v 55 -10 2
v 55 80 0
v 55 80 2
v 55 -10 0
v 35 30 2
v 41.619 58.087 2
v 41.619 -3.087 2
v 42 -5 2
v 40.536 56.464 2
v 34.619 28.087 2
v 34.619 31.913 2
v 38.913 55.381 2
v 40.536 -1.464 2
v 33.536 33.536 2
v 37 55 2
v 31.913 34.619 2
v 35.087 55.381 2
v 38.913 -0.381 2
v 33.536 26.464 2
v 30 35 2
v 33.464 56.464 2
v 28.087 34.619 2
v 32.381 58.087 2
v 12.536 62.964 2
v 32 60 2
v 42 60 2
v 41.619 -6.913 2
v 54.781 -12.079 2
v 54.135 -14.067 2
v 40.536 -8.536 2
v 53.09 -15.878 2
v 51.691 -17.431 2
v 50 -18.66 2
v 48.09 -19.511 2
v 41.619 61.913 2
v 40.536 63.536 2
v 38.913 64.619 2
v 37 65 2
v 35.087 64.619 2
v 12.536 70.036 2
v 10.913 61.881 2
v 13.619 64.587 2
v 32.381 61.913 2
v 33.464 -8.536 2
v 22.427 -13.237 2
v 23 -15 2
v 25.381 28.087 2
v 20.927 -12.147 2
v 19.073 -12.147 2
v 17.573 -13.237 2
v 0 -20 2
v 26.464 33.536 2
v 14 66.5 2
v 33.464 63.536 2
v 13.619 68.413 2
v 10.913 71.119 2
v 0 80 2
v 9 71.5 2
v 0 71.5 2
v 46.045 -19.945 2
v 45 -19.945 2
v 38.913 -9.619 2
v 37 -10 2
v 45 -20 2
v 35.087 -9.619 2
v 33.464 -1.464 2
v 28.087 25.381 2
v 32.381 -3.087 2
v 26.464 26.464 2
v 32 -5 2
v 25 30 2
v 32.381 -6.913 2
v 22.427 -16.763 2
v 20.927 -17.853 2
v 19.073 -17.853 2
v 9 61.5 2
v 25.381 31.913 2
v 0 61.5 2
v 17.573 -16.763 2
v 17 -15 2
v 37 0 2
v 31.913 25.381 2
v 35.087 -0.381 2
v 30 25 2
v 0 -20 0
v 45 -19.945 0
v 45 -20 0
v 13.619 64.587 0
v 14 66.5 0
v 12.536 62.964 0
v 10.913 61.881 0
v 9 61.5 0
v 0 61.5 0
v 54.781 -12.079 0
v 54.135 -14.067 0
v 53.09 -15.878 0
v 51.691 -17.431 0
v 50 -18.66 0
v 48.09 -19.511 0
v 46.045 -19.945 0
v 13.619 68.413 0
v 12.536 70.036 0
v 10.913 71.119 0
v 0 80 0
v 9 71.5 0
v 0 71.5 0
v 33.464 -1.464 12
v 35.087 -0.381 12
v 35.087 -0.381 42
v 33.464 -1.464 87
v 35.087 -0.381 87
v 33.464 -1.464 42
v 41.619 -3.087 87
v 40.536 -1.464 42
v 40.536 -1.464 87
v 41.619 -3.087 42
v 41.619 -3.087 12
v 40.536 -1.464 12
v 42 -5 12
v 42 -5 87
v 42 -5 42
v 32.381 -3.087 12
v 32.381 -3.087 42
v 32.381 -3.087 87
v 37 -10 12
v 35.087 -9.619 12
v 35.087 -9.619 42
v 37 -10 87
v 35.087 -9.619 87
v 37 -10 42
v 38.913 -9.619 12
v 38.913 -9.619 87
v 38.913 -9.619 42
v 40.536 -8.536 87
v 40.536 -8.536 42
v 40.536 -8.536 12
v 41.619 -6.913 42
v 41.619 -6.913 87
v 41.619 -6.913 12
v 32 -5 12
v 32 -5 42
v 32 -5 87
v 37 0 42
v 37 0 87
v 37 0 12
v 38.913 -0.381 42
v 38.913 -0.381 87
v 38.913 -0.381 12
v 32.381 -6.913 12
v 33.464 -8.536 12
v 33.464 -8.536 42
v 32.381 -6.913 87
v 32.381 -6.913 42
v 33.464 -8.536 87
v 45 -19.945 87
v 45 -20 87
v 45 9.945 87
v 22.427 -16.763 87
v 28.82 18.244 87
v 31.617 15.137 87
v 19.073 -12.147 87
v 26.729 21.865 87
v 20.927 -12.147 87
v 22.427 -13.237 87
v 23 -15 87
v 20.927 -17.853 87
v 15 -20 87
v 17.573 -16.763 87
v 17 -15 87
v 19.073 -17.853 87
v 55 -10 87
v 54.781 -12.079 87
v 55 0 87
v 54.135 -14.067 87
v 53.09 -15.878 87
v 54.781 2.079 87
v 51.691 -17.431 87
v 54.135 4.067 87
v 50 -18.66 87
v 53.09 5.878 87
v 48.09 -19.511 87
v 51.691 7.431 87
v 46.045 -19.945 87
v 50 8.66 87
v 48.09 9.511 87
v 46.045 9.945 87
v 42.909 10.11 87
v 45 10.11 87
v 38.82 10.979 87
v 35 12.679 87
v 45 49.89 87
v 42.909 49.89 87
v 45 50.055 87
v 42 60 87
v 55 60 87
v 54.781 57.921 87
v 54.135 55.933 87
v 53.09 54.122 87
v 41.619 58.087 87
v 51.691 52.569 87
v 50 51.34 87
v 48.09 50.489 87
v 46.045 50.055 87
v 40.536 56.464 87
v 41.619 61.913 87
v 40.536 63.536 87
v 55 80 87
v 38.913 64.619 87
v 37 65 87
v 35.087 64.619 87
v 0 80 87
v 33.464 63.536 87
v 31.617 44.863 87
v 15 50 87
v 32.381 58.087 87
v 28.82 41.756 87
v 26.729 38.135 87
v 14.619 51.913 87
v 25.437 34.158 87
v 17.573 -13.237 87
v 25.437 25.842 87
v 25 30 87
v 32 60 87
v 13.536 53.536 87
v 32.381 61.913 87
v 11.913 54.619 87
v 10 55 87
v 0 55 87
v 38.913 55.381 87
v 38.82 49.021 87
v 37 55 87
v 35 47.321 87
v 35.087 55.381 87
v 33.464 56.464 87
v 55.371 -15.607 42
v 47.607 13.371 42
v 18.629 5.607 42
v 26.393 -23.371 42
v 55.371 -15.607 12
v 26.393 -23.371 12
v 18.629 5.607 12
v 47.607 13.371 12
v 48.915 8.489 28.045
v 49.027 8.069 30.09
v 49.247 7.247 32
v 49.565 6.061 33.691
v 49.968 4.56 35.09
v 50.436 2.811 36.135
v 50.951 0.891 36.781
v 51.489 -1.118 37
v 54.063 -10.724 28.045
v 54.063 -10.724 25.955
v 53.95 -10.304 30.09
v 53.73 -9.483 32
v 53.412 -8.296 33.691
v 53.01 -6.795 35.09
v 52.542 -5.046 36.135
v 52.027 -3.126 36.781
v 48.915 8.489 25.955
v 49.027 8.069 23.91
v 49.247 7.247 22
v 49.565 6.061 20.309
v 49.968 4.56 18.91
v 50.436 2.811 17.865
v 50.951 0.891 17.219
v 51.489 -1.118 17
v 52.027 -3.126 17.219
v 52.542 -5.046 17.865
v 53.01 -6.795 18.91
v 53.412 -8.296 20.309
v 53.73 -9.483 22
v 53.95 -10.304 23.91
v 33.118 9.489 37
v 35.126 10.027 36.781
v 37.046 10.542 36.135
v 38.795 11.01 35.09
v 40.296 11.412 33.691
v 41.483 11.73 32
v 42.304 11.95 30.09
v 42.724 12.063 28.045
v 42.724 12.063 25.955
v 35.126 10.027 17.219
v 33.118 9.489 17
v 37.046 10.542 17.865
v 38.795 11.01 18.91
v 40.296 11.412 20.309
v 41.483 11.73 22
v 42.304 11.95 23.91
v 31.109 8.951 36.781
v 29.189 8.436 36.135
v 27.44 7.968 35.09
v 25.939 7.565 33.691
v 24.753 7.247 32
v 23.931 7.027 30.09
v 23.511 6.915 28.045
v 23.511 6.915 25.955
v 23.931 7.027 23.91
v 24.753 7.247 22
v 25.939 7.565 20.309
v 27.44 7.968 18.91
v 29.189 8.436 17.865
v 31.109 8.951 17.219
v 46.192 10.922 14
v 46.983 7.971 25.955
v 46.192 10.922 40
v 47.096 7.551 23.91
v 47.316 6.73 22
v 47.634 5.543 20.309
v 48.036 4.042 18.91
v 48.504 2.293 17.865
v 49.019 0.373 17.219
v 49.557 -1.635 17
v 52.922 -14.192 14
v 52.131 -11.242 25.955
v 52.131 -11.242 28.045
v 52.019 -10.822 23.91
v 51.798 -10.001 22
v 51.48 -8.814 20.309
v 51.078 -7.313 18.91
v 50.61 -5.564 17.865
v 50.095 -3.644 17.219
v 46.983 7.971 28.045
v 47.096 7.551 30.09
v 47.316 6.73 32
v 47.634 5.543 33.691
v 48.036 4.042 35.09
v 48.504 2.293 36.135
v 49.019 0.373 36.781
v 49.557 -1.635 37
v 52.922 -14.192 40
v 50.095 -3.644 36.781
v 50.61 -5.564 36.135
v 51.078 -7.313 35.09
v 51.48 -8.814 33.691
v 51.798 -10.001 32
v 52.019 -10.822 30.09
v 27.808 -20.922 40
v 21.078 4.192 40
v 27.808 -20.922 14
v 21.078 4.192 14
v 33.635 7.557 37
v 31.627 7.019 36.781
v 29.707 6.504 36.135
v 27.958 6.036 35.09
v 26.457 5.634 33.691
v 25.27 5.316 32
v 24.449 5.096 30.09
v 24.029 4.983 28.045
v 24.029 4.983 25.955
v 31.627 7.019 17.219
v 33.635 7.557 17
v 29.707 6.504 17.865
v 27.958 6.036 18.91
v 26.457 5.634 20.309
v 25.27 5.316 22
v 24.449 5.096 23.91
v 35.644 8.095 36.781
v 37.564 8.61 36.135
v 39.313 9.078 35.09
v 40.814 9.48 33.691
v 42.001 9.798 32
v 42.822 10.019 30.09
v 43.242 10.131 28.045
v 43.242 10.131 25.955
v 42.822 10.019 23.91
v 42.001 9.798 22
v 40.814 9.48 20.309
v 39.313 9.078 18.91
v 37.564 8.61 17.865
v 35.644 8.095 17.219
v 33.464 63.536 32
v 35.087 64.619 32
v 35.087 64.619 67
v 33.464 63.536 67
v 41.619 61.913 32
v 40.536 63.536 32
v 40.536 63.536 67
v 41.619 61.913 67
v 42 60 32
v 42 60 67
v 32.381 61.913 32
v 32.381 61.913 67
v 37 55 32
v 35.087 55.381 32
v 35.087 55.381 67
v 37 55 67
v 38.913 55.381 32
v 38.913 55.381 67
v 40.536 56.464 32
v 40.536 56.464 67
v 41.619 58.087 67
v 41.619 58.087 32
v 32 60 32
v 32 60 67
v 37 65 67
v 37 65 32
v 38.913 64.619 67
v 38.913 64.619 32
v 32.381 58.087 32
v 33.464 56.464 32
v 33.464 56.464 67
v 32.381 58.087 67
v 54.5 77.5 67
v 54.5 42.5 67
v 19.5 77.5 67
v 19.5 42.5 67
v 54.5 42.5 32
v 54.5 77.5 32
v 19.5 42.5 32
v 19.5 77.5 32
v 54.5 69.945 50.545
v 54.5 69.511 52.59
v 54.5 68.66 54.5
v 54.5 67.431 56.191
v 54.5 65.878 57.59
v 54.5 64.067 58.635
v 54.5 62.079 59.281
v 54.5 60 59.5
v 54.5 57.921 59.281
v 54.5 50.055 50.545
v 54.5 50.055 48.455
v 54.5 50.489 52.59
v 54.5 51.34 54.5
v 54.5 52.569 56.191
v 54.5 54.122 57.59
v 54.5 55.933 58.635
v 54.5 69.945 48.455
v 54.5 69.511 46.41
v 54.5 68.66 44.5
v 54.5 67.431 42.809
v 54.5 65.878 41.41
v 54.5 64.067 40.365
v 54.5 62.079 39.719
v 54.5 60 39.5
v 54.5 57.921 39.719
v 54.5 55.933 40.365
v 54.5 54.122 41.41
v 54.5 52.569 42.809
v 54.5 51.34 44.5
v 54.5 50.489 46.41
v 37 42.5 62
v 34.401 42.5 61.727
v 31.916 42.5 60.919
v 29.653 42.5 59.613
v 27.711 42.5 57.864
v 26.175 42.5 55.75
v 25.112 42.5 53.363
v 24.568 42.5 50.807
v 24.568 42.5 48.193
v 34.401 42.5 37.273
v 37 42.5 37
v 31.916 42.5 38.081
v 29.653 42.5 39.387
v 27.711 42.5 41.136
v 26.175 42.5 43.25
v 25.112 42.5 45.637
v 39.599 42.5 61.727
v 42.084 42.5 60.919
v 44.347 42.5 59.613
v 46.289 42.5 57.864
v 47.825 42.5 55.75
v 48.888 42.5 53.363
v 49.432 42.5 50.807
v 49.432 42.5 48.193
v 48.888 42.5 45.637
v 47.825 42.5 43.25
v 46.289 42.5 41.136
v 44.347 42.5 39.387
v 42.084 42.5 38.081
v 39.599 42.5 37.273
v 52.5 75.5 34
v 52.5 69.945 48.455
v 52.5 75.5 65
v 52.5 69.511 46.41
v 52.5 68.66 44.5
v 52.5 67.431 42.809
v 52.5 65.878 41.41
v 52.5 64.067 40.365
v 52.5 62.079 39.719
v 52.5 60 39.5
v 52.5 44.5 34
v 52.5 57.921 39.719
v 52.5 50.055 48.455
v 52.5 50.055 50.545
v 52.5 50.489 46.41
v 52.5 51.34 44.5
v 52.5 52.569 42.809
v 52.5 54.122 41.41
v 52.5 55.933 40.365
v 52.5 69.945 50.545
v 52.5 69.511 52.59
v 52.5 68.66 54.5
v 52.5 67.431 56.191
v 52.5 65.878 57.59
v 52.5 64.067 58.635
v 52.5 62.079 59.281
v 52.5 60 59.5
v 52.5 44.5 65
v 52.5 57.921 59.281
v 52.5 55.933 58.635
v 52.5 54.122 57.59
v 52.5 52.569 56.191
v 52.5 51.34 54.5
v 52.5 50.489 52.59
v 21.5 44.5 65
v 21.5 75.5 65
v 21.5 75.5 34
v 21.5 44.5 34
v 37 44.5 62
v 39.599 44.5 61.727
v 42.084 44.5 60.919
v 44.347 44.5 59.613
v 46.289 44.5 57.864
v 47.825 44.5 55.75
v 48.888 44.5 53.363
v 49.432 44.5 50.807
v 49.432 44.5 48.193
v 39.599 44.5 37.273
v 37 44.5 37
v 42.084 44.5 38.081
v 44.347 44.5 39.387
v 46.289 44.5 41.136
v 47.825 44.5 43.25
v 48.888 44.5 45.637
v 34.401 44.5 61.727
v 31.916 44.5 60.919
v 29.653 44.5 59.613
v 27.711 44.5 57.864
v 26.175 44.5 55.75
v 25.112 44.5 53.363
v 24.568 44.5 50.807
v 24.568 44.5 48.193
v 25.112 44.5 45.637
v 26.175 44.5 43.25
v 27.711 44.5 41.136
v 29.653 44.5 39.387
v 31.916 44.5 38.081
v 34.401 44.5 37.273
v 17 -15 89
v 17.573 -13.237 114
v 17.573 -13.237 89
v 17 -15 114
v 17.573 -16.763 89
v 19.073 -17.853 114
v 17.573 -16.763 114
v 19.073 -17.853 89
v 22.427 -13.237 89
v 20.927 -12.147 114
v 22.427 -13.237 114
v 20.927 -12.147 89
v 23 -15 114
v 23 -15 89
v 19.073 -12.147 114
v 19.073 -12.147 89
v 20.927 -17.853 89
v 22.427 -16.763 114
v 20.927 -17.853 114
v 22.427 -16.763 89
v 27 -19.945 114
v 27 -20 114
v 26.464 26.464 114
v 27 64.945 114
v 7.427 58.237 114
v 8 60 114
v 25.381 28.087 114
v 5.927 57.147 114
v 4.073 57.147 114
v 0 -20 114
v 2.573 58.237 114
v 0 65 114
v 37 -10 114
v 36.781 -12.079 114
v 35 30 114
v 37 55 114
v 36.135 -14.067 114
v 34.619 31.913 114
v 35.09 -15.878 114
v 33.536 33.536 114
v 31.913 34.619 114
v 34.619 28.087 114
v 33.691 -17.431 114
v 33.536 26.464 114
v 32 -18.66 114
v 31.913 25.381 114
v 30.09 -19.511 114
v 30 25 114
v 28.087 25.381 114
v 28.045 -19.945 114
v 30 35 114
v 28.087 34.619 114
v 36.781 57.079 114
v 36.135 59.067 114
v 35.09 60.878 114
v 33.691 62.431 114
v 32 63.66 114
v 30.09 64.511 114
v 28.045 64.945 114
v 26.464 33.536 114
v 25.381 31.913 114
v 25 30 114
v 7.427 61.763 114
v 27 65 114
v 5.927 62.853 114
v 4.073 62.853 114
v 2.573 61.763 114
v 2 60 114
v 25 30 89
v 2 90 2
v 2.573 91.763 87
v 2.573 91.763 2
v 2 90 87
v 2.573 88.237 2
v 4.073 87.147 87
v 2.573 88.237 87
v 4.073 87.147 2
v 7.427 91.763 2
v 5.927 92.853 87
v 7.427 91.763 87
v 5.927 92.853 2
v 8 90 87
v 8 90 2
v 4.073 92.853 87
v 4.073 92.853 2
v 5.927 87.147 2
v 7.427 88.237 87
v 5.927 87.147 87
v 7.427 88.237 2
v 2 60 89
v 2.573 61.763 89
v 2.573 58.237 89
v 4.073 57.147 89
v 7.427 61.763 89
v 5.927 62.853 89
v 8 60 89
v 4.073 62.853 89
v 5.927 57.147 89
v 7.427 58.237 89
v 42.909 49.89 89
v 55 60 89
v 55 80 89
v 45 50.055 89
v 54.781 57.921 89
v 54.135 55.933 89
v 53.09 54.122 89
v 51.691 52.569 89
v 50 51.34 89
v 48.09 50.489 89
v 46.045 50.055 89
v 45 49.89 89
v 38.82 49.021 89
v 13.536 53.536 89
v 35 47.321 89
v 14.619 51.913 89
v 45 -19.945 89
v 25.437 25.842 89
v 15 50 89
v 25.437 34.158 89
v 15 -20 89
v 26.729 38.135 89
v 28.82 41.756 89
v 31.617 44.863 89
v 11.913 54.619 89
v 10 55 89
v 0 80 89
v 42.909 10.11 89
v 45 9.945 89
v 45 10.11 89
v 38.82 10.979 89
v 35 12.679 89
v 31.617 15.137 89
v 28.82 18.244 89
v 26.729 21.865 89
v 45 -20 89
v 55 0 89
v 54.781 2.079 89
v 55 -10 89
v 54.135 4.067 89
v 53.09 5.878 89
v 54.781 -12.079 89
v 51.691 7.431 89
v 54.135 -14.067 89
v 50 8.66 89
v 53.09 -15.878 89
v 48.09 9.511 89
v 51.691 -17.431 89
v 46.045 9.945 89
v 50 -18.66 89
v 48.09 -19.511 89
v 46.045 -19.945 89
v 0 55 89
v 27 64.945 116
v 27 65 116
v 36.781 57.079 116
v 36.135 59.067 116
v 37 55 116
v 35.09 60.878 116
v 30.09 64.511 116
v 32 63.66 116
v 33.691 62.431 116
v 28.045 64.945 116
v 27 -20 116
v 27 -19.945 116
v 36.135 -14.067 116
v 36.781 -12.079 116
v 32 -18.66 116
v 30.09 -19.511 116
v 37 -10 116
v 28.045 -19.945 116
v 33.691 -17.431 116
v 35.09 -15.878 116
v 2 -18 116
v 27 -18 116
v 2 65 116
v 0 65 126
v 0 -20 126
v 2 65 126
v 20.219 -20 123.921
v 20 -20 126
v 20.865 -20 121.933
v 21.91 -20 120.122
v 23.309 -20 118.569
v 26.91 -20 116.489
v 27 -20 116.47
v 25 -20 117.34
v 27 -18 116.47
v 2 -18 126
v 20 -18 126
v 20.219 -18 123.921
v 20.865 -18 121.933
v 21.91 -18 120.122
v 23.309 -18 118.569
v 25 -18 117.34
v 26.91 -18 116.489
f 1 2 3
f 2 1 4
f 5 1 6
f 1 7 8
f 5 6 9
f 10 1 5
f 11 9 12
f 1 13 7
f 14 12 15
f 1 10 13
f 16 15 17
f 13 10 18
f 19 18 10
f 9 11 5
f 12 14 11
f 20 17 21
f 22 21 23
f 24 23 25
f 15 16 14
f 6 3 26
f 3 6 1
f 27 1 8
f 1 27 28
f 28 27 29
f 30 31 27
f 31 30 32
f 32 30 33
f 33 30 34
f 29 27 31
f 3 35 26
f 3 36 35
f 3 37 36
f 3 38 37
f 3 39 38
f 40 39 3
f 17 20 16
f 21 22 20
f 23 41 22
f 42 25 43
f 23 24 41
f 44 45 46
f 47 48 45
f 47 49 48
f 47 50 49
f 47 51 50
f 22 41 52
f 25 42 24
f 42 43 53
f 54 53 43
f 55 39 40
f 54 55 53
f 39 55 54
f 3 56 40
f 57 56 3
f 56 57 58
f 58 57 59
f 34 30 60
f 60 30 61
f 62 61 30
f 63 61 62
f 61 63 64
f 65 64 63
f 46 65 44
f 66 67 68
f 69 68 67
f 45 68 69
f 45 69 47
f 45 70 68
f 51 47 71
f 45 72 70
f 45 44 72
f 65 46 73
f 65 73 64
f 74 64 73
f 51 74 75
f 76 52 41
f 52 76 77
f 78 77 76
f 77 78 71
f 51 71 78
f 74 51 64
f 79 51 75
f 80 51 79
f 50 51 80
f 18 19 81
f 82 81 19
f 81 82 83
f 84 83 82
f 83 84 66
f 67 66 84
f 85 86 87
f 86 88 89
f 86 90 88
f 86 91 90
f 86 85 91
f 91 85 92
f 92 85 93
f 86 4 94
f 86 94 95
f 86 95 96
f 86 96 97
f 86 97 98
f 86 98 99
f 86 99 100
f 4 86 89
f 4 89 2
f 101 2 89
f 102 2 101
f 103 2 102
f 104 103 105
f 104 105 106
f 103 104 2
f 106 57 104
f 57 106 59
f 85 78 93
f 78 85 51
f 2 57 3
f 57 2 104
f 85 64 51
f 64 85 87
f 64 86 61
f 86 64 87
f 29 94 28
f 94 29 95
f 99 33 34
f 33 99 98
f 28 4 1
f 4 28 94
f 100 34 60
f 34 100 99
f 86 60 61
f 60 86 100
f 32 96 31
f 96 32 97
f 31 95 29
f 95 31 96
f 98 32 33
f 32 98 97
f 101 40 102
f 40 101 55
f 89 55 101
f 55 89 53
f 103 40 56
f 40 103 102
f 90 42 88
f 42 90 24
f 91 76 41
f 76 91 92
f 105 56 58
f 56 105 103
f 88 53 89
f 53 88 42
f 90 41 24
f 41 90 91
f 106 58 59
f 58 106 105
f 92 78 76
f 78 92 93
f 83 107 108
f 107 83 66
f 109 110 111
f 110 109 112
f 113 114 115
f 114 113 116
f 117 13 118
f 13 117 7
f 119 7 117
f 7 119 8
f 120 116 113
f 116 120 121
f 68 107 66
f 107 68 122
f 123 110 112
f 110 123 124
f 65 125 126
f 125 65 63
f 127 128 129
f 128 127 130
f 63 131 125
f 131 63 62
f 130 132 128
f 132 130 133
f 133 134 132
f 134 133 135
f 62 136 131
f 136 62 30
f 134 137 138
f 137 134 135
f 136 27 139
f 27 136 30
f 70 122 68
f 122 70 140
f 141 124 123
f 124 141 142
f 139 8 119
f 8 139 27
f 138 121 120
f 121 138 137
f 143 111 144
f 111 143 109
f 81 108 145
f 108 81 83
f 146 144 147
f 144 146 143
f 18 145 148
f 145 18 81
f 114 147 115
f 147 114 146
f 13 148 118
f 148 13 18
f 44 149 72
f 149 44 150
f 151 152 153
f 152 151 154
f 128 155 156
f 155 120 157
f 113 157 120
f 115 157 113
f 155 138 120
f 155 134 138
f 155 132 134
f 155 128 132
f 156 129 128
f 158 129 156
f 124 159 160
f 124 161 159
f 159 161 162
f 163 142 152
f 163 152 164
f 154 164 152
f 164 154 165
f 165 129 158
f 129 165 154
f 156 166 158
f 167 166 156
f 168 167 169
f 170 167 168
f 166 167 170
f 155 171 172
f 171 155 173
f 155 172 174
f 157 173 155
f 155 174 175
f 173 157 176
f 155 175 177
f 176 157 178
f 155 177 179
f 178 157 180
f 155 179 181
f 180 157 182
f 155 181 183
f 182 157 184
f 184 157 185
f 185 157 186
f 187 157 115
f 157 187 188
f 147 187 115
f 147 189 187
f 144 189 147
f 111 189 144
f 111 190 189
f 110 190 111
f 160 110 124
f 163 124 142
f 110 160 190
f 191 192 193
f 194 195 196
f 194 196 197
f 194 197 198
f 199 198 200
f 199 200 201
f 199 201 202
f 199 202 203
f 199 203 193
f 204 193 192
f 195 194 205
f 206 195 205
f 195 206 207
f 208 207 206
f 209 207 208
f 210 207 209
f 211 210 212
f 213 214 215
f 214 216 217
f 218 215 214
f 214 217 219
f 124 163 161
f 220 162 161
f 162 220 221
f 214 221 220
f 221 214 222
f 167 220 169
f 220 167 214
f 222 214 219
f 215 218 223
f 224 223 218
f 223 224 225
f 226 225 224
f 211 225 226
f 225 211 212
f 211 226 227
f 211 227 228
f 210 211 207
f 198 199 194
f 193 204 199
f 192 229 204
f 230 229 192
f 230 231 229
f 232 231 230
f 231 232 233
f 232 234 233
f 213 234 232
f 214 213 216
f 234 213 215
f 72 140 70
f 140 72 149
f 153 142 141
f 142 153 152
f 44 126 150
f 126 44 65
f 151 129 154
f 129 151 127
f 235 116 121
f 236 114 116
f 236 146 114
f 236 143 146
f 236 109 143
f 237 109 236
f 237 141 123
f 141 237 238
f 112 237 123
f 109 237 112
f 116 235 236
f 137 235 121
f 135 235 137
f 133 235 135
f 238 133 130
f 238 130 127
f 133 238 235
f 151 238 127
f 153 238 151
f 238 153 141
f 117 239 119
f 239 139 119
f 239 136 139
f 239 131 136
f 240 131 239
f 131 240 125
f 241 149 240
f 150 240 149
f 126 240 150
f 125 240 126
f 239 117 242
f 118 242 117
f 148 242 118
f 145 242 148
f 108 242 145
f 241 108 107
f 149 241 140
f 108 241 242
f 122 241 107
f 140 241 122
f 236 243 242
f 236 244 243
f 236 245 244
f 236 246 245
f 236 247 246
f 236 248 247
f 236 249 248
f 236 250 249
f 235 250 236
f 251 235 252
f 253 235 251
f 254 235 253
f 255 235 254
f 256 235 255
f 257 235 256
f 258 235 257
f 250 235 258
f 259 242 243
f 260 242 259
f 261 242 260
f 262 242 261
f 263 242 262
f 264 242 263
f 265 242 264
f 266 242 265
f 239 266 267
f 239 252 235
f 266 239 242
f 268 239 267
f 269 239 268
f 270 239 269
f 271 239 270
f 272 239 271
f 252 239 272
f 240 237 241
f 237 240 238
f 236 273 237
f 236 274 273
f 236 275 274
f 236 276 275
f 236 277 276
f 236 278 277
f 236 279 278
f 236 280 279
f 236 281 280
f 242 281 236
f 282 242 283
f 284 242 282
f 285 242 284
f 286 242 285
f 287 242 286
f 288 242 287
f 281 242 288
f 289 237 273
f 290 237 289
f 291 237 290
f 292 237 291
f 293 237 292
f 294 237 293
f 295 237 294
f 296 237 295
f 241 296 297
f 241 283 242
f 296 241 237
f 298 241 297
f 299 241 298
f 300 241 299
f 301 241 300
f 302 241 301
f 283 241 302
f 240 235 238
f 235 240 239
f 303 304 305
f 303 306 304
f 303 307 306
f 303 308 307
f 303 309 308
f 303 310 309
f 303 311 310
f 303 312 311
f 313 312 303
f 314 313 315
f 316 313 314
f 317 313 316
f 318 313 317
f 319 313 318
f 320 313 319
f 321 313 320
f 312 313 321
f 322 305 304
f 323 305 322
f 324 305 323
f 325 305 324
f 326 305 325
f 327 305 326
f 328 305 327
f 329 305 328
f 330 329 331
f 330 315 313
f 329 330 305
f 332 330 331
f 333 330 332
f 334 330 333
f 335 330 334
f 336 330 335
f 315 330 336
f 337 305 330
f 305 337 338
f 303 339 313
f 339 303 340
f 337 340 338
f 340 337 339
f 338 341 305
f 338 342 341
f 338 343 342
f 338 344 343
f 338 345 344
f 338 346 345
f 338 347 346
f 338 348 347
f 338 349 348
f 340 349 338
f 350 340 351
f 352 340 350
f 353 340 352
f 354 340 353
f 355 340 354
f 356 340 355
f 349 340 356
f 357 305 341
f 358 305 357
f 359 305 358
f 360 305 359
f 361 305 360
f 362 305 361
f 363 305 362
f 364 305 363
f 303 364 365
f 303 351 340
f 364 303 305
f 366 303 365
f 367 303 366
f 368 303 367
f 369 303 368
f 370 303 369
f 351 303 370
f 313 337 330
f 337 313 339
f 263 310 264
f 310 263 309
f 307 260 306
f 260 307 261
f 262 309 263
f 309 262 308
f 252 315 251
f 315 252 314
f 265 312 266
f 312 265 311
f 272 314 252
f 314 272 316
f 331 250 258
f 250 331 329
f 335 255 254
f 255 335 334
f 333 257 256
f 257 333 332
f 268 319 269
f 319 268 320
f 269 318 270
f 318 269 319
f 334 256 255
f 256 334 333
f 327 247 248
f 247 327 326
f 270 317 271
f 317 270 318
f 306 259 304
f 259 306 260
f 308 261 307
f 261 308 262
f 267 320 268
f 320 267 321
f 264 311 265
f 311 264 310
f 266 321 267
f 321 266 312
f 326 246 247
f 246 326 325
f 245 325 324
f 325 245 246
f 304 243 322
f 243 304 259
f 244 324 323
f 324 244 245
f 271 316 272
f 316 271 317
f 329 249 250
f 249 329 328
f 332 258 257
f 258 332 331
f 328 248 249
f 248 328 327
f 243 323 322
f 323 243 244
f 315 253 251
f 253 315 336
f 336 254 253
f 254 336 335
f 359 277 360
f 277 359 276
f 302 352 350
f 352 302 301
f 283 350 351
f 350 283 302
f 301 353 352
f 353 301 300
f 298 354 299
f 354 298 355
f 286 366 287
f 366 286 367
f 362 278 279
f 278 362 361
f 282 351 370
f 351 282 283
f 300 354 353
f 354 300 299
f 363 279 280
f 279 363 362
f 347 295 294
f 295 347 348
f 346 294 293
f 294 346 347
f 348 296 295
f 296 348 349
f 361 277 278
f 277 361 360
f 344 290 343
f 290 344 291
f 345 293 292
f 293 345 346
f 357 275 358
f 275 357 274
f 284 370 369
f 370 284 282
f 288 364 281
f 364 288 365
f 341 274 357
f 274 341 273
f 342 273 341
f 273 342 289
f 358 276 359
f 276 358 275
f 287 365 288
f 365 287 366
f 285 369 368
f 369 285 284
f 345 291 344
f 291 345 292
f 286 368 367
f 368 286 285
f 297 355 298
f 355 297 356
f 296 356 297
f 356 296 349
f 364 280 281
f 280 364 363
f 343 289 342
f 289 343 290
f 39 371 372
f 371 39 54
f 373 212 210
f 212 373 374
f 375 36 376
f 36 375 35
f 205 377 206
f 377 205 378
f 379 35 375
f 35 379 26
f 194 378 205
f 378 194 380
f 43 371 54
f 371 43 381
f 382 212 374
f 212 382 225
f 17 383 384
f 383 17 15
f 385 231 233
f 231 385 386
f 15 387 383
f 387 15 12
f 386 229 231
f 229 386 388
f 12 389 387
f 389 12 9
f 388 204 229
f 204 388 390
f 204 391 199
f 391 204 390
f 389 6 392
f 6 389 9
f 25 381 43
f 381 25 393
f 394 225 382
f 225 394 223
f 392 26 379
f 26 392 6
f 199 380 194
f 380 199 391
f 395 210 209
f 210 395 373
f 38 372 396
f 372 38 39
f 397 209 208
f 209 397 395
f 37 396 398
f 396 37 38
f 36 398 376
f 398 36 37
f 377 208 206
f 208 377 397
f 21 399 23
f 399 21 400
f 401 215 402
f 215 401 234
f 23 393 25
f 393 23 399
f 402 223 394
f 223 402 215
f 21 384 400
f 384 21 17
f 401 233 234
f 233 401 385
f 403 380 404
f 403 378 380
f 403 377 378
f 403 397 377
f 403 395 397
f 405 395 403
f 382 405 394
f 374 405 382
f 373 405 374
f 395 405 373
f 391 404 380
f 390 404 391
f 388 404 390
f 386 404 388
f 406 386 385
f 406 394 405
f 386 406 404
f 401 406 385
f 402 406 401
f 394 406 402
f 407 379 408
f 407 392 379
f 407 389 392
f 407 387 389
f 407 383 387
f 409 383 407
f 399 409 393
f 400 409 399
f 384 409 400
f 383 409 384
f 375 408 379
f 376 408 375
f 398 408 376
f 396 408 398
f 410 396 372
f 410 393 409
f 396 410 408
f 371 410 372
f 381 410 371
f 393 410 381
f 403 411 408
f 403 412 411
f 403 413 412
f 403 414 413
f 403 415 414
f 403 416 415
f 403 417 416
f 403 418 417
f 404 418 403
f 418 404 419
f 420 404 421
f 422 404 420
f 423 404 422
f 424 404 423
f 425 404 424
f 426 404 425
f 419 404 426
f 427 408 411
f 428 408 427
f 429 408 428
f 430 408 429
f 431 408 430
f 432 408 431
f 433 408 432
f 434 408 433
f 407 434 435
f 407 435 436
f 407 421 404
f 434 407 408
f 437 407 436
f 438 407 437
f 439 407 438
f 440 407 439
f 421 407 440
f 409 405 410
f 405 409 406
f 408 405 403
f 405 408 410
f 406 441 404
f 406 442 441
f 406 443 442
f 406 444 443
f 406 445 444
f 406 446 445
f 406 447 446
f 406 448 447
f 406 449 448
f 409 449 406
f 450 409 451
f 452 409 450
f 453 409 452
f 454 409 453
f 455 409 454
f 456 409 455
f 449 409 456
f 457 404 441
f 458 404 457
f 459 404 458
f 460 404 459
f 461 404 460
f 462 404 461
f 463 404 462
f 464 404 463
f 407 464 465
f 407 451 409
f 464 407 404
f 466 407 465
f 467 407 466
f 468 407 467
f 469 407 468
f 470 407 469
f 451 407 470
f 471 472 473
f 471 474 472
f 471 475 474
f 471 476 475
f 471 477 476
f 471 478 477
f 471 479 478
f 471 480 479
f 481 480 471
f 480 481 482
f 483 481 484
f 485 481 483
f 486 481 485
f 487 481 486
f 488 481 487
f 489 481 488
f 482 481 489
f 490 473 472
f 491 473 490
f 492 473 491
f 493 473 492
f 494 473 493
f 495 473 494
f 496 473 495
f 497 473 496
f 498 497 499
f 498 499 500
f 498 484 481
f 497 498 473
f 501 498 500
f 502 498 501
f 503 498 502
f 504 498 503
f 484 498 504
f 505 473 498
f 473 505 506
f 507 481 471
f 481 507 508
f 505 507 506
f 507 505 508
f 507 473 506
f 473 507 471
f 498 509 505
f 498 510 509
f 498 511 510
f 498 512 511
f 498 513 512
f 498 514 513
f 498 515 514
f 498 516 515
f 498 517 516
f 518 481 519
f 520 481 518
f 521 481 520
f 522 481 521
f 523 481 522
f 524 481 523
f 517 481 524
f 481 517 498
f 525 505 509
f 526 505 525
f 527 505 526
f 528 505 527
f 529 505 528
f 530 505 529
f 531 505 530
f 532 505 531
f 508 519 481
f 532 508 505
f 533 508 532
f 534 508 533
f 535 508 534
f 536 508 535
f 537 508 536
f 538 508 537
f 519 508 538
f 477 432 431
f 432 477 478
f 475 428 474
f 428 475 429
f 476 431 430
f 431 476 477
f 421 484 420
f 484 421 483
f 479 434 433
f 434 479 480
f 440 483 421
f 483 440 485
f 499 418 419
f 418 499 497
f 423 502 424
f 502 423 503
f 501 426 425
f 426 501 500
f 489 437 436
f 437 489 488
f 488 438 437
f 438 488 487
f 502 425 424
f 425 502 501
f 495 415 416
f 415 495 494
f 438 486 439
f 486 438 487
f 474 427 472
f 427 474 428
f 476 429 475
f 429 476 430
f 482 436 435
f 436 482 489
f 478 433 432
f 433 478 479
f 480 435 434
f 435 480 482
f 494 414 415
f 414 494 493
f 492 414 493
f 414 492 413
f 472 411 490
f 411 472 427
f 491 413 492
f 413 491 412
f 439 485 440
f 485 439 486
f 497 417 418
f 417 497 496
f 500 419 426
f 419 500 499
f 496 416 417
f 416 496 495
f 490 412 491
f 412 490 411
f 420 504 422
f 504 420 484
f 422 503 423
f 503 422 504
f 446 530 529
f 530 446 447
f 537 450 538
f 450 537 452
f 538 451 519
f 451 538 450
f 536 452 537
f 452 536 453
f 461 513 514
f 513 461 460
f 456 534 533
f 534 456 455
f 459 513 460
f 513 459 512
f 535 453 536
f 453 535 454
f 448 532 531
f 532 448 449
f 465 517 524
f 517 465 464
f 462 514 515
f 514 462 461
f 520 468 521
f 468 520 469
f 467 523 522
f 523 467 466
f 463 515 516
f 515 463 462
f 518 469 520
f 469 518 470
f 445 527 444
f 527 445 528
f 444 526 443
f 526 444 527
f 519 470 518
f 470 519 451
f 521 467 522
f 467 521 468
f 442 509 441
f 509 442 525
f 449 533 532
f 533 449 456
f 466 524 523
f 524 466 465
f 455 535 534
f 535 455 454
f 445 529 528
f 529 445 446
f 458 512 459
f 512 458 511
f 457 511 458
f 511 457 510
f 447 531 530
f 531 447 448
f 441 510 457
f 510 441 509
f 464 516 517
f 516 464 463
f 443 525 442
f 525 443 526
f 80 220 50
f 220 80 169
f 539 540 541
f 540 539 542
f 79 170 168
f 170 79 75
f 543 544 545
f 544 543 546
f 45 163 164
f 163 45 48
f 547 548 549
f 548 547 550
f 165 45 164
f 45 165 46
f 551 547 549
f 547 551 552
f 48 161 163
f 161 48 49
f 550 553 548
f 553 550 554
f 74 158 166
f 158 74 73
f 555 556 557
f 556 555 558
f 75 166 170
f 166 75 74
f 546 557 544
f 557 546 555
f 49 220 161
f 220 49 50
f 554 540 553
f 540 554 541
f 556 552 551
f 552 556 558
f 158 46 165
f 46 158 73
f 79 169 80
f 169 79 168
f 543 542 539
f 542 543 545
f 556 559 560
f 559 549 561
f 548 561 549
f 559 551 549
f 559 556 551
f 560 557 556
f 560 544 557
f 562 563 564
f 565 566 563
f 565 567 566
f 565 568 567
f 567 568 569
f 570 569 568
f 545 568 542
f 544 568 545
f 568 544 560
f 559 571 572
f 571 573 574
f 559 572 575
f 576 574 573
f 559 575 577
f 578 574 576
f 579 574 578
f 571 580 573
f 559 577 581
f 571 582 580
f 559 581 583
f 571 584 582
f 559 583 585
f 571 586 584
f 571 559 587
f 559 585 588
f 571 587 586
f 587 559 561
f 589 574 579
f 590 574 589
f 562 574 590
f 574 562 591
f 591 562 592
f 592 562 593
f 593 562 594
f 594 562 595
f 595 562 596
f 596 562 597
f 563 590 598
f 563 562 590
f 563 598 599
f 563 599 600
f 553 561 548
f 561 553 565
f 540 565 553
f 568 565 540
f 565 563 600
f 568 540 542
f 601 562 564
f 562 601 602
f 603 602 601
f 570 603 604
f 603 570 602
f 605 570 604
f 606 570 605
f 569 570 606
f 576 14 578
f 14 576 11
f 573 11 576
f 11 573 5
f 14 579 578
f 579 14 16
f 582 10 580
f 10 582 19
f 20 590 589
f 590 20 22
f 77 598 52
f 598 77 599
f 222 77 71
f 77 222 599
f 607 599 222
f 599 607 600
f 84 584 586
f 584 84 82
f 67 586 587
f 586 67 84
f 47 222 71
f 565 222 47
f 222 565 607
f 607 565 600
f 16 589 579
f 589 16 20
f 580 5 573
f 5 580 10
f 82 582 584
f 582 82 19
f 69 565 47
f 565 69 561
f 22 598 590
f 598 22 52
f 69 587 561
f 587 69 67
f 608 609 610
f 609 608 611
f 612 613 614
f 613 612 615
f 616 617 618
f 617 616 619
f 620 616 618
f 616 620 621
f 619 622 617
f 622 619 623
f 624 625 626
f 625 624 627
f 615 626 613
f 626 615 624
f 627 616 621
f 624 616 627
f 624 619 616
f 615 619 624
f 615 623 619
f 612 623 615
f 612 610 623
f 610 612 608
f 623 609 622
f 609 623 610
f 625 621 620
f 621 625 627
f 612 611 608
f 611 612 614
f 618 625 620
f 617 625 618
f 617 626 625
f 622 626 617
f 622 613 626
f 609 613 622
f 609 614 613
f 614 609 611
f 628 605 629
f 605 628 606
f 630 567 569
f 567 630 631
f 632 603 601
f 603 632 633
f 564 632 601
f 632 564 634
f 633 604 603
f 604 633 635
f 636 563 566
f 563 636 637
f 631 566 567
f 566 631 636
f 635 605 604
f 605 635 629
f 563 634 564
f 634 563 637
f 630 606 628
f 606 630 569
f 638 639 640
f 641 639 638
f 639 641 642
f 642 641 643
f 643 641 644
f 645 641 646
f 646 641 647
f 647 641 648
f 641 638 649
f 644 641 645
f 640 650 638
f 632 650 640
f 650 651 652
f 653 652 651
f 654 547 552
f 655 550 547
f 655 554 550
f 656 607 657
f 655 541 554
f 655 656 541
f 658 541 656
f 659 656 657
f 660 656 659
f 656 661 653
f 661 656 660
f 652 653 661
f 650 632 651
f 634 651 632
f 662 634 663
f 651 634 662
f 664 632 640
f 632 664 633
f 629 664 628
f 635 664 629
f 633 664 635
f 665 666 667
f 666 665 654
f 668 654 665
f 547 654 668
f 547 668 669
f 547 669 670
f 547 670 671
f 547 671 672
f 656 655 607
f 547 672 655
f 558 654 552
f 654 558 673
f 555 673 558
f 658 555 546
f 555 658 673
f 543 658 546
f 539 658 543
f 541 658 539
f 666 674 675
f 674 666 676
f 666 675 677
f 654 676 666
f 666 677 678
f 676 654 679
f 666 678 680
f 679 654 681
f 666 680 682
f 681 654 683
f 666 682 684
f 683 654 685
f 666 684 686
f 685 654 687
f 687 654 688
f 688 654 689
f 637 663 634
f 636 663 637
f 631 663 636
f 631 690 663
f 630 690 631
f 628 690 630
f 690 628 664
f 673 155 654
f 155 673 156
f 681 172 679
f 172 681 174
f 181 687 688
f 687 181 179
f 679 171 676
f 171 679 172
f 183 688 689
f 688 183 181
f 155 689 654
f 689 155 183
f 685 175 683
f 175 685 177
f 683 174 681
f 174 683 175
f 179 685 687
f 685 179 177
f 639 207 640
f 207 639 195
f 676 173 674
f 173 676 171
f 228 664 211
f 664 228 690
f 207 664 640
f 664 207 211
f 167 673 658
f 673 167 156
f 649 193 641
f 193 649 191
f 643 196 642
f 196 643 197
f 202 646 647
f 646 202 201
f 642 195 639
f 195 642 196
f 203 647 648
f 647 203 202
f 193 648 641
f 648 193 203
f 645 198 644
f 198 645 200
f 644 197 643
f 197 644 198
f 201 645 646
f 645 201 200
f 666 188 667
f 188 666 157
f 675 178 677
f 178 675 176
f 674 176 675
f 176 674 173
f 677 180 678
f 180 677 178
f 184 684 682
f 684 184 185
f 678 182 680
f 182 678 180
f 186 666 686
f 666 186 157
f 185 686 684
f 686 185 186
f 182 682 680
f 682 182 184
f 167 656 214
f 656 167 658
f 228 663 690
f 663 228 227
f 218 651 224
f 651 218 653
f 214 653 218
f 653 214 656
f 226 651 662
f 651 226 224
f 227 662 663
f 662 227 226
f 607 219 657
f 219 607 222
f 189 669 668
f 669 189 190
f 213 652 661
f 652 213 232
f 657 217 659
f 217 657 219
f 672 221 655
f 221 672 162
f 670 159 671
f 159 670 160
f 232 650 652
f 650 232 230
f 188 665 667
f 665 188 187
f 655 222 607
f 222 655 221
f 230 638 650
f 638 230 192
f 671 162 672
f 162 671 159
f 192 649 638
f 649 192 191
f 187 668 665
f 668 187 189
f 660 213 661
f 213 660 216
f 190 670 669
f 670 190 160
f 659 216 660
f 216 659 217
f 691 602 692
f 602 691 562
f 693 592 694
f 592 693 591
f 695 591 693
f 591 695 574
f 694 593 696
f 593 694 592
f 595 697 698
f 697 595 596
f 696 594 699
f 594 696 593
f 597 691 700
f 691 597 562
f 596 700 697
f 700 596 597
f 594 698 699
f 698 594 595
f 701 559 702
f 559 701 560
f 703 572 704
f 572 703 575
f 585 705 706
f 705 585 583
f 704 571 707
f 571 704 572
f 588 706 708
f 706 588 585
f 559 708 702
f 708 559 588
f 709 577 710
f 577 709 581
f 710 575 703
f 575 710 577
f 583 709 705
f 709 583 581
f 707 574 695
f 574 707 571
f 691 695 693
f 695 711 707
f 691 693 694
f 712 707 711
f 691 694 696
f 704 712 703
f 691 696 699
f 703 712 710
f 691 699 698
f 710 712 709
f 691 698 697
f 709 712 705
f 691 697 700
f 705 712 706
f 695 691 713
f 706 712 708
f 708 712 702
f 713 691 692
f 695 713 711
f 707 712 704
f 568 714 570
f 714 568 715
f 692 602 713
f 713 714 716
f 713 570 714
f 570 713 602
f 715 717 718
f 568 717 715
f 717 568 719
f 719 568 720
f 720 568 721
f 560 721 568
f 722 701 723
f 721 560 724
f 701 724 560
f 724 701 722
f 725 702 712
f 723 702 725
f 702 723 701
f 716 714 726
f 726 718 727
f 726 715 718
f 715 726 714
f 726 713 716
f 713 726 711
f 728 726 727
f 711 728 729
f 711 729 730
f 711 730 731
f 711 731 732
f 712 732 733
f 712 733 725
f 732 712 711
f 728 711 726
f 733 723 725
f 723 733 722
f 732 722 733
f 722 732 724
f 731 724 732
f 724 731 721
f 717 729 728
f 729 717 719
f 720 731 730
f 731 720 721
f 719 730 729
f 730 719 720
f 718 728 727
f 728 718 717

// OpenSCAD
//verwarming (space that needs to stay clear), use red
/*
color("red") {
	translate([0,-121,0]) cube([45,80, 160]);
	translate([0,-40,0]) {
		translate([0,0,14]) cube([15,100,51]);
		translate([8,105,20]) cylinder(r = 1, h=44);
		translate([8,100,64]) {rotate(a = [-90,0,0]) cylinder(r = 1, h = 5.5);}
		translate([8,104,0]) cylinder(r = 2, h=18);
		translate([8,109,0]) cylinder(r = 2, h=18);
		translate([8,100,18]) {rotate(a = [-90,0,0]) cylinder(r = 2, h = 13);}
		translate([8,106,58]) {rotate(a = [-90,0,0]) cylinder(r = 3, h = 12);}
	}
};
*/
floordimentions = [55,100,2];
//groundlevel
difference(){
	union(){
		translate([0,-20,0]) cube(floordimentions); 
		polyhedron (points =[
								[0,80,0],[0,100,0],[55,80,0] //base
								,[0,80,2],[0,100,2],[55,80,2] //top
							],
						triangles = [
										[0,1,2],
										[3,4,5],
										[0,1,3],[3,1,4],[1,2,4],[2,4,5],[0,2,3],[3,2,5]
						]);
	}
	translate([9,66.5, -1]) cylinder(r = 5, h = 4);
	translate([-1,61.5, -1]) cube([10,10,4]);
	translate([45,-25,-1]) {
		difference() {
			cube([15,15,4]);
			translate([0,15,-1]) cylinder(r = 10, h = 6);
		}
	}	
};
// between groundlevel & firstfloor
translate([0,0,2])
union(){	
	//poles
	translate([20,-15,0]) cylinder(r = 3, h = 112);
	translate([30,30,0]) {color("green") cylinder(r = 5, h = 112);}
	translate([5,90,0]) cylinder(r = 3, h = 85);
	translate([5,60,87]) cylinder(r = 3, h = 25);
	translate ([37,-5,0]) union() {
	color("green"){
 		difference(){
			cylinder(r =5, h = 85);
			translate([-15,-15,10]) cube([30,30,30]);
		}
	}
	
	rotate(a=[0,0,15]){
						translate([-15,-15, 10]) difference() {
											color("blue"){cube([30,30,30]);}
											translate ([2,2,2])cube([26,26,26]);
											translate([27, 15, 15]){rotate( a=[0,90,0]) cylinder(r = 10, h = 4);}
											translate([15, 27, 15]){rotate( a=[0,90,90]) cylinder(r = 10, h = 4);}
											}
					}
	}
	translate ([37,60,0]) union() {
		color("green") {
			difference(){
				cylinder(r =5, h = 85);
				translate([-17.5,-17.5,30]) cube([35,35,35]);
			}
		}
	
		rotate(a=[0,0,0]){
							translate([-17.5,-17.5, 30]) difference() {
												color("blue"){cube([35,35,35]);}
												translate ([2,2,2])cube([31,31,31]);
												translate([32, 17.5, 17.5]){rotate( a=[0,90,0]) cylinder(r = 10, h = 4);}
												translate([17.5, -1, 17.5]){rotate( a=[0,90,90]) cylinder(r = 12.5, h = 4);}
												}
						}
		}

};
//firstfloor
translate ([0,0,87]) union(){
	difference() {
		union(){
			translate([0,-20,0]) cube(floordimentions);
			polyhedron (points =[
									[0,80,0],[0,100,0],[55,80,0] //base
									,[0,80,2],[0,100,2],[55,80,2] //top
								],
							triangles = [
											[0,1,2],
											[0,1,3],[0,2,3],
											[3,4,5],
											[3,1,4],[3,2,5],[1,2,4],[2,4,5]
							]);
		}
	translate([-1,-21,-1]) cube([16,71,4]);
	translate([-1,-21,-1]) cube([11,76,4]);
	translate([10,50,-1]) cylinder(r = 5, h = 4);
	//translate([35,20,-1]) cube([21,20,4]);
	translate([45,-25,-1]) {
		difference() {
			cube([15,15,4]);
			translate([0,15,-1]) cylinder(r = 10, h = 6);
		}
	}	
	translate([35,0,-1]) {
		difference() {
			cube([21,20,4]);
			translate([0,0,-1]) cylinder(r = 20, h = 6);
		}
	}
	translate([45,30,-1]) cylinder(r = 20, h = 6);
	translate([45,45,-1]) {
		difference() {
			cube([15,15,4]);
			translate([0,15,-1]) cylinder(r = 10, h = 6);
		}
	}
	translate([45,0,-1]) {
		difference() {
			cube([15,15,4]);
			translate([0,0,-1]) cylinder(r = 10, h = 6);
		}
	}
	
	 //holes for support poles, commented out for printing
	//translate([20,-15,-1]) cylinder(r = 3, h = 4);
	//translate([25,30,-1]) cylinder(r = 5, h = 4);
	
	}
};
//top floor
difference() {
	translate([0,-20,114]) cube([37,85, 2]);
	translate([27,55,113]) {
		difference() {
			cube([15,15,4]);
			translate([0,0,-1]) cylinder(r = 10, h = 6);
		}
	}
	translate([27,-25,113]) {
		difference() {
			cube([15,15,4]);
			translate([0,15,-1]) cylinder(r = 10, h = 6);
		}
	}
}
translate([0,-20,116]) cube([2,85, 10]);
difference(){
translate([2,-20,116]) cube([25,2, 10]);
translate([30,-17,126]) {rotate(a=[90,0,0]) cylinder(r=10, h=4);}
}
